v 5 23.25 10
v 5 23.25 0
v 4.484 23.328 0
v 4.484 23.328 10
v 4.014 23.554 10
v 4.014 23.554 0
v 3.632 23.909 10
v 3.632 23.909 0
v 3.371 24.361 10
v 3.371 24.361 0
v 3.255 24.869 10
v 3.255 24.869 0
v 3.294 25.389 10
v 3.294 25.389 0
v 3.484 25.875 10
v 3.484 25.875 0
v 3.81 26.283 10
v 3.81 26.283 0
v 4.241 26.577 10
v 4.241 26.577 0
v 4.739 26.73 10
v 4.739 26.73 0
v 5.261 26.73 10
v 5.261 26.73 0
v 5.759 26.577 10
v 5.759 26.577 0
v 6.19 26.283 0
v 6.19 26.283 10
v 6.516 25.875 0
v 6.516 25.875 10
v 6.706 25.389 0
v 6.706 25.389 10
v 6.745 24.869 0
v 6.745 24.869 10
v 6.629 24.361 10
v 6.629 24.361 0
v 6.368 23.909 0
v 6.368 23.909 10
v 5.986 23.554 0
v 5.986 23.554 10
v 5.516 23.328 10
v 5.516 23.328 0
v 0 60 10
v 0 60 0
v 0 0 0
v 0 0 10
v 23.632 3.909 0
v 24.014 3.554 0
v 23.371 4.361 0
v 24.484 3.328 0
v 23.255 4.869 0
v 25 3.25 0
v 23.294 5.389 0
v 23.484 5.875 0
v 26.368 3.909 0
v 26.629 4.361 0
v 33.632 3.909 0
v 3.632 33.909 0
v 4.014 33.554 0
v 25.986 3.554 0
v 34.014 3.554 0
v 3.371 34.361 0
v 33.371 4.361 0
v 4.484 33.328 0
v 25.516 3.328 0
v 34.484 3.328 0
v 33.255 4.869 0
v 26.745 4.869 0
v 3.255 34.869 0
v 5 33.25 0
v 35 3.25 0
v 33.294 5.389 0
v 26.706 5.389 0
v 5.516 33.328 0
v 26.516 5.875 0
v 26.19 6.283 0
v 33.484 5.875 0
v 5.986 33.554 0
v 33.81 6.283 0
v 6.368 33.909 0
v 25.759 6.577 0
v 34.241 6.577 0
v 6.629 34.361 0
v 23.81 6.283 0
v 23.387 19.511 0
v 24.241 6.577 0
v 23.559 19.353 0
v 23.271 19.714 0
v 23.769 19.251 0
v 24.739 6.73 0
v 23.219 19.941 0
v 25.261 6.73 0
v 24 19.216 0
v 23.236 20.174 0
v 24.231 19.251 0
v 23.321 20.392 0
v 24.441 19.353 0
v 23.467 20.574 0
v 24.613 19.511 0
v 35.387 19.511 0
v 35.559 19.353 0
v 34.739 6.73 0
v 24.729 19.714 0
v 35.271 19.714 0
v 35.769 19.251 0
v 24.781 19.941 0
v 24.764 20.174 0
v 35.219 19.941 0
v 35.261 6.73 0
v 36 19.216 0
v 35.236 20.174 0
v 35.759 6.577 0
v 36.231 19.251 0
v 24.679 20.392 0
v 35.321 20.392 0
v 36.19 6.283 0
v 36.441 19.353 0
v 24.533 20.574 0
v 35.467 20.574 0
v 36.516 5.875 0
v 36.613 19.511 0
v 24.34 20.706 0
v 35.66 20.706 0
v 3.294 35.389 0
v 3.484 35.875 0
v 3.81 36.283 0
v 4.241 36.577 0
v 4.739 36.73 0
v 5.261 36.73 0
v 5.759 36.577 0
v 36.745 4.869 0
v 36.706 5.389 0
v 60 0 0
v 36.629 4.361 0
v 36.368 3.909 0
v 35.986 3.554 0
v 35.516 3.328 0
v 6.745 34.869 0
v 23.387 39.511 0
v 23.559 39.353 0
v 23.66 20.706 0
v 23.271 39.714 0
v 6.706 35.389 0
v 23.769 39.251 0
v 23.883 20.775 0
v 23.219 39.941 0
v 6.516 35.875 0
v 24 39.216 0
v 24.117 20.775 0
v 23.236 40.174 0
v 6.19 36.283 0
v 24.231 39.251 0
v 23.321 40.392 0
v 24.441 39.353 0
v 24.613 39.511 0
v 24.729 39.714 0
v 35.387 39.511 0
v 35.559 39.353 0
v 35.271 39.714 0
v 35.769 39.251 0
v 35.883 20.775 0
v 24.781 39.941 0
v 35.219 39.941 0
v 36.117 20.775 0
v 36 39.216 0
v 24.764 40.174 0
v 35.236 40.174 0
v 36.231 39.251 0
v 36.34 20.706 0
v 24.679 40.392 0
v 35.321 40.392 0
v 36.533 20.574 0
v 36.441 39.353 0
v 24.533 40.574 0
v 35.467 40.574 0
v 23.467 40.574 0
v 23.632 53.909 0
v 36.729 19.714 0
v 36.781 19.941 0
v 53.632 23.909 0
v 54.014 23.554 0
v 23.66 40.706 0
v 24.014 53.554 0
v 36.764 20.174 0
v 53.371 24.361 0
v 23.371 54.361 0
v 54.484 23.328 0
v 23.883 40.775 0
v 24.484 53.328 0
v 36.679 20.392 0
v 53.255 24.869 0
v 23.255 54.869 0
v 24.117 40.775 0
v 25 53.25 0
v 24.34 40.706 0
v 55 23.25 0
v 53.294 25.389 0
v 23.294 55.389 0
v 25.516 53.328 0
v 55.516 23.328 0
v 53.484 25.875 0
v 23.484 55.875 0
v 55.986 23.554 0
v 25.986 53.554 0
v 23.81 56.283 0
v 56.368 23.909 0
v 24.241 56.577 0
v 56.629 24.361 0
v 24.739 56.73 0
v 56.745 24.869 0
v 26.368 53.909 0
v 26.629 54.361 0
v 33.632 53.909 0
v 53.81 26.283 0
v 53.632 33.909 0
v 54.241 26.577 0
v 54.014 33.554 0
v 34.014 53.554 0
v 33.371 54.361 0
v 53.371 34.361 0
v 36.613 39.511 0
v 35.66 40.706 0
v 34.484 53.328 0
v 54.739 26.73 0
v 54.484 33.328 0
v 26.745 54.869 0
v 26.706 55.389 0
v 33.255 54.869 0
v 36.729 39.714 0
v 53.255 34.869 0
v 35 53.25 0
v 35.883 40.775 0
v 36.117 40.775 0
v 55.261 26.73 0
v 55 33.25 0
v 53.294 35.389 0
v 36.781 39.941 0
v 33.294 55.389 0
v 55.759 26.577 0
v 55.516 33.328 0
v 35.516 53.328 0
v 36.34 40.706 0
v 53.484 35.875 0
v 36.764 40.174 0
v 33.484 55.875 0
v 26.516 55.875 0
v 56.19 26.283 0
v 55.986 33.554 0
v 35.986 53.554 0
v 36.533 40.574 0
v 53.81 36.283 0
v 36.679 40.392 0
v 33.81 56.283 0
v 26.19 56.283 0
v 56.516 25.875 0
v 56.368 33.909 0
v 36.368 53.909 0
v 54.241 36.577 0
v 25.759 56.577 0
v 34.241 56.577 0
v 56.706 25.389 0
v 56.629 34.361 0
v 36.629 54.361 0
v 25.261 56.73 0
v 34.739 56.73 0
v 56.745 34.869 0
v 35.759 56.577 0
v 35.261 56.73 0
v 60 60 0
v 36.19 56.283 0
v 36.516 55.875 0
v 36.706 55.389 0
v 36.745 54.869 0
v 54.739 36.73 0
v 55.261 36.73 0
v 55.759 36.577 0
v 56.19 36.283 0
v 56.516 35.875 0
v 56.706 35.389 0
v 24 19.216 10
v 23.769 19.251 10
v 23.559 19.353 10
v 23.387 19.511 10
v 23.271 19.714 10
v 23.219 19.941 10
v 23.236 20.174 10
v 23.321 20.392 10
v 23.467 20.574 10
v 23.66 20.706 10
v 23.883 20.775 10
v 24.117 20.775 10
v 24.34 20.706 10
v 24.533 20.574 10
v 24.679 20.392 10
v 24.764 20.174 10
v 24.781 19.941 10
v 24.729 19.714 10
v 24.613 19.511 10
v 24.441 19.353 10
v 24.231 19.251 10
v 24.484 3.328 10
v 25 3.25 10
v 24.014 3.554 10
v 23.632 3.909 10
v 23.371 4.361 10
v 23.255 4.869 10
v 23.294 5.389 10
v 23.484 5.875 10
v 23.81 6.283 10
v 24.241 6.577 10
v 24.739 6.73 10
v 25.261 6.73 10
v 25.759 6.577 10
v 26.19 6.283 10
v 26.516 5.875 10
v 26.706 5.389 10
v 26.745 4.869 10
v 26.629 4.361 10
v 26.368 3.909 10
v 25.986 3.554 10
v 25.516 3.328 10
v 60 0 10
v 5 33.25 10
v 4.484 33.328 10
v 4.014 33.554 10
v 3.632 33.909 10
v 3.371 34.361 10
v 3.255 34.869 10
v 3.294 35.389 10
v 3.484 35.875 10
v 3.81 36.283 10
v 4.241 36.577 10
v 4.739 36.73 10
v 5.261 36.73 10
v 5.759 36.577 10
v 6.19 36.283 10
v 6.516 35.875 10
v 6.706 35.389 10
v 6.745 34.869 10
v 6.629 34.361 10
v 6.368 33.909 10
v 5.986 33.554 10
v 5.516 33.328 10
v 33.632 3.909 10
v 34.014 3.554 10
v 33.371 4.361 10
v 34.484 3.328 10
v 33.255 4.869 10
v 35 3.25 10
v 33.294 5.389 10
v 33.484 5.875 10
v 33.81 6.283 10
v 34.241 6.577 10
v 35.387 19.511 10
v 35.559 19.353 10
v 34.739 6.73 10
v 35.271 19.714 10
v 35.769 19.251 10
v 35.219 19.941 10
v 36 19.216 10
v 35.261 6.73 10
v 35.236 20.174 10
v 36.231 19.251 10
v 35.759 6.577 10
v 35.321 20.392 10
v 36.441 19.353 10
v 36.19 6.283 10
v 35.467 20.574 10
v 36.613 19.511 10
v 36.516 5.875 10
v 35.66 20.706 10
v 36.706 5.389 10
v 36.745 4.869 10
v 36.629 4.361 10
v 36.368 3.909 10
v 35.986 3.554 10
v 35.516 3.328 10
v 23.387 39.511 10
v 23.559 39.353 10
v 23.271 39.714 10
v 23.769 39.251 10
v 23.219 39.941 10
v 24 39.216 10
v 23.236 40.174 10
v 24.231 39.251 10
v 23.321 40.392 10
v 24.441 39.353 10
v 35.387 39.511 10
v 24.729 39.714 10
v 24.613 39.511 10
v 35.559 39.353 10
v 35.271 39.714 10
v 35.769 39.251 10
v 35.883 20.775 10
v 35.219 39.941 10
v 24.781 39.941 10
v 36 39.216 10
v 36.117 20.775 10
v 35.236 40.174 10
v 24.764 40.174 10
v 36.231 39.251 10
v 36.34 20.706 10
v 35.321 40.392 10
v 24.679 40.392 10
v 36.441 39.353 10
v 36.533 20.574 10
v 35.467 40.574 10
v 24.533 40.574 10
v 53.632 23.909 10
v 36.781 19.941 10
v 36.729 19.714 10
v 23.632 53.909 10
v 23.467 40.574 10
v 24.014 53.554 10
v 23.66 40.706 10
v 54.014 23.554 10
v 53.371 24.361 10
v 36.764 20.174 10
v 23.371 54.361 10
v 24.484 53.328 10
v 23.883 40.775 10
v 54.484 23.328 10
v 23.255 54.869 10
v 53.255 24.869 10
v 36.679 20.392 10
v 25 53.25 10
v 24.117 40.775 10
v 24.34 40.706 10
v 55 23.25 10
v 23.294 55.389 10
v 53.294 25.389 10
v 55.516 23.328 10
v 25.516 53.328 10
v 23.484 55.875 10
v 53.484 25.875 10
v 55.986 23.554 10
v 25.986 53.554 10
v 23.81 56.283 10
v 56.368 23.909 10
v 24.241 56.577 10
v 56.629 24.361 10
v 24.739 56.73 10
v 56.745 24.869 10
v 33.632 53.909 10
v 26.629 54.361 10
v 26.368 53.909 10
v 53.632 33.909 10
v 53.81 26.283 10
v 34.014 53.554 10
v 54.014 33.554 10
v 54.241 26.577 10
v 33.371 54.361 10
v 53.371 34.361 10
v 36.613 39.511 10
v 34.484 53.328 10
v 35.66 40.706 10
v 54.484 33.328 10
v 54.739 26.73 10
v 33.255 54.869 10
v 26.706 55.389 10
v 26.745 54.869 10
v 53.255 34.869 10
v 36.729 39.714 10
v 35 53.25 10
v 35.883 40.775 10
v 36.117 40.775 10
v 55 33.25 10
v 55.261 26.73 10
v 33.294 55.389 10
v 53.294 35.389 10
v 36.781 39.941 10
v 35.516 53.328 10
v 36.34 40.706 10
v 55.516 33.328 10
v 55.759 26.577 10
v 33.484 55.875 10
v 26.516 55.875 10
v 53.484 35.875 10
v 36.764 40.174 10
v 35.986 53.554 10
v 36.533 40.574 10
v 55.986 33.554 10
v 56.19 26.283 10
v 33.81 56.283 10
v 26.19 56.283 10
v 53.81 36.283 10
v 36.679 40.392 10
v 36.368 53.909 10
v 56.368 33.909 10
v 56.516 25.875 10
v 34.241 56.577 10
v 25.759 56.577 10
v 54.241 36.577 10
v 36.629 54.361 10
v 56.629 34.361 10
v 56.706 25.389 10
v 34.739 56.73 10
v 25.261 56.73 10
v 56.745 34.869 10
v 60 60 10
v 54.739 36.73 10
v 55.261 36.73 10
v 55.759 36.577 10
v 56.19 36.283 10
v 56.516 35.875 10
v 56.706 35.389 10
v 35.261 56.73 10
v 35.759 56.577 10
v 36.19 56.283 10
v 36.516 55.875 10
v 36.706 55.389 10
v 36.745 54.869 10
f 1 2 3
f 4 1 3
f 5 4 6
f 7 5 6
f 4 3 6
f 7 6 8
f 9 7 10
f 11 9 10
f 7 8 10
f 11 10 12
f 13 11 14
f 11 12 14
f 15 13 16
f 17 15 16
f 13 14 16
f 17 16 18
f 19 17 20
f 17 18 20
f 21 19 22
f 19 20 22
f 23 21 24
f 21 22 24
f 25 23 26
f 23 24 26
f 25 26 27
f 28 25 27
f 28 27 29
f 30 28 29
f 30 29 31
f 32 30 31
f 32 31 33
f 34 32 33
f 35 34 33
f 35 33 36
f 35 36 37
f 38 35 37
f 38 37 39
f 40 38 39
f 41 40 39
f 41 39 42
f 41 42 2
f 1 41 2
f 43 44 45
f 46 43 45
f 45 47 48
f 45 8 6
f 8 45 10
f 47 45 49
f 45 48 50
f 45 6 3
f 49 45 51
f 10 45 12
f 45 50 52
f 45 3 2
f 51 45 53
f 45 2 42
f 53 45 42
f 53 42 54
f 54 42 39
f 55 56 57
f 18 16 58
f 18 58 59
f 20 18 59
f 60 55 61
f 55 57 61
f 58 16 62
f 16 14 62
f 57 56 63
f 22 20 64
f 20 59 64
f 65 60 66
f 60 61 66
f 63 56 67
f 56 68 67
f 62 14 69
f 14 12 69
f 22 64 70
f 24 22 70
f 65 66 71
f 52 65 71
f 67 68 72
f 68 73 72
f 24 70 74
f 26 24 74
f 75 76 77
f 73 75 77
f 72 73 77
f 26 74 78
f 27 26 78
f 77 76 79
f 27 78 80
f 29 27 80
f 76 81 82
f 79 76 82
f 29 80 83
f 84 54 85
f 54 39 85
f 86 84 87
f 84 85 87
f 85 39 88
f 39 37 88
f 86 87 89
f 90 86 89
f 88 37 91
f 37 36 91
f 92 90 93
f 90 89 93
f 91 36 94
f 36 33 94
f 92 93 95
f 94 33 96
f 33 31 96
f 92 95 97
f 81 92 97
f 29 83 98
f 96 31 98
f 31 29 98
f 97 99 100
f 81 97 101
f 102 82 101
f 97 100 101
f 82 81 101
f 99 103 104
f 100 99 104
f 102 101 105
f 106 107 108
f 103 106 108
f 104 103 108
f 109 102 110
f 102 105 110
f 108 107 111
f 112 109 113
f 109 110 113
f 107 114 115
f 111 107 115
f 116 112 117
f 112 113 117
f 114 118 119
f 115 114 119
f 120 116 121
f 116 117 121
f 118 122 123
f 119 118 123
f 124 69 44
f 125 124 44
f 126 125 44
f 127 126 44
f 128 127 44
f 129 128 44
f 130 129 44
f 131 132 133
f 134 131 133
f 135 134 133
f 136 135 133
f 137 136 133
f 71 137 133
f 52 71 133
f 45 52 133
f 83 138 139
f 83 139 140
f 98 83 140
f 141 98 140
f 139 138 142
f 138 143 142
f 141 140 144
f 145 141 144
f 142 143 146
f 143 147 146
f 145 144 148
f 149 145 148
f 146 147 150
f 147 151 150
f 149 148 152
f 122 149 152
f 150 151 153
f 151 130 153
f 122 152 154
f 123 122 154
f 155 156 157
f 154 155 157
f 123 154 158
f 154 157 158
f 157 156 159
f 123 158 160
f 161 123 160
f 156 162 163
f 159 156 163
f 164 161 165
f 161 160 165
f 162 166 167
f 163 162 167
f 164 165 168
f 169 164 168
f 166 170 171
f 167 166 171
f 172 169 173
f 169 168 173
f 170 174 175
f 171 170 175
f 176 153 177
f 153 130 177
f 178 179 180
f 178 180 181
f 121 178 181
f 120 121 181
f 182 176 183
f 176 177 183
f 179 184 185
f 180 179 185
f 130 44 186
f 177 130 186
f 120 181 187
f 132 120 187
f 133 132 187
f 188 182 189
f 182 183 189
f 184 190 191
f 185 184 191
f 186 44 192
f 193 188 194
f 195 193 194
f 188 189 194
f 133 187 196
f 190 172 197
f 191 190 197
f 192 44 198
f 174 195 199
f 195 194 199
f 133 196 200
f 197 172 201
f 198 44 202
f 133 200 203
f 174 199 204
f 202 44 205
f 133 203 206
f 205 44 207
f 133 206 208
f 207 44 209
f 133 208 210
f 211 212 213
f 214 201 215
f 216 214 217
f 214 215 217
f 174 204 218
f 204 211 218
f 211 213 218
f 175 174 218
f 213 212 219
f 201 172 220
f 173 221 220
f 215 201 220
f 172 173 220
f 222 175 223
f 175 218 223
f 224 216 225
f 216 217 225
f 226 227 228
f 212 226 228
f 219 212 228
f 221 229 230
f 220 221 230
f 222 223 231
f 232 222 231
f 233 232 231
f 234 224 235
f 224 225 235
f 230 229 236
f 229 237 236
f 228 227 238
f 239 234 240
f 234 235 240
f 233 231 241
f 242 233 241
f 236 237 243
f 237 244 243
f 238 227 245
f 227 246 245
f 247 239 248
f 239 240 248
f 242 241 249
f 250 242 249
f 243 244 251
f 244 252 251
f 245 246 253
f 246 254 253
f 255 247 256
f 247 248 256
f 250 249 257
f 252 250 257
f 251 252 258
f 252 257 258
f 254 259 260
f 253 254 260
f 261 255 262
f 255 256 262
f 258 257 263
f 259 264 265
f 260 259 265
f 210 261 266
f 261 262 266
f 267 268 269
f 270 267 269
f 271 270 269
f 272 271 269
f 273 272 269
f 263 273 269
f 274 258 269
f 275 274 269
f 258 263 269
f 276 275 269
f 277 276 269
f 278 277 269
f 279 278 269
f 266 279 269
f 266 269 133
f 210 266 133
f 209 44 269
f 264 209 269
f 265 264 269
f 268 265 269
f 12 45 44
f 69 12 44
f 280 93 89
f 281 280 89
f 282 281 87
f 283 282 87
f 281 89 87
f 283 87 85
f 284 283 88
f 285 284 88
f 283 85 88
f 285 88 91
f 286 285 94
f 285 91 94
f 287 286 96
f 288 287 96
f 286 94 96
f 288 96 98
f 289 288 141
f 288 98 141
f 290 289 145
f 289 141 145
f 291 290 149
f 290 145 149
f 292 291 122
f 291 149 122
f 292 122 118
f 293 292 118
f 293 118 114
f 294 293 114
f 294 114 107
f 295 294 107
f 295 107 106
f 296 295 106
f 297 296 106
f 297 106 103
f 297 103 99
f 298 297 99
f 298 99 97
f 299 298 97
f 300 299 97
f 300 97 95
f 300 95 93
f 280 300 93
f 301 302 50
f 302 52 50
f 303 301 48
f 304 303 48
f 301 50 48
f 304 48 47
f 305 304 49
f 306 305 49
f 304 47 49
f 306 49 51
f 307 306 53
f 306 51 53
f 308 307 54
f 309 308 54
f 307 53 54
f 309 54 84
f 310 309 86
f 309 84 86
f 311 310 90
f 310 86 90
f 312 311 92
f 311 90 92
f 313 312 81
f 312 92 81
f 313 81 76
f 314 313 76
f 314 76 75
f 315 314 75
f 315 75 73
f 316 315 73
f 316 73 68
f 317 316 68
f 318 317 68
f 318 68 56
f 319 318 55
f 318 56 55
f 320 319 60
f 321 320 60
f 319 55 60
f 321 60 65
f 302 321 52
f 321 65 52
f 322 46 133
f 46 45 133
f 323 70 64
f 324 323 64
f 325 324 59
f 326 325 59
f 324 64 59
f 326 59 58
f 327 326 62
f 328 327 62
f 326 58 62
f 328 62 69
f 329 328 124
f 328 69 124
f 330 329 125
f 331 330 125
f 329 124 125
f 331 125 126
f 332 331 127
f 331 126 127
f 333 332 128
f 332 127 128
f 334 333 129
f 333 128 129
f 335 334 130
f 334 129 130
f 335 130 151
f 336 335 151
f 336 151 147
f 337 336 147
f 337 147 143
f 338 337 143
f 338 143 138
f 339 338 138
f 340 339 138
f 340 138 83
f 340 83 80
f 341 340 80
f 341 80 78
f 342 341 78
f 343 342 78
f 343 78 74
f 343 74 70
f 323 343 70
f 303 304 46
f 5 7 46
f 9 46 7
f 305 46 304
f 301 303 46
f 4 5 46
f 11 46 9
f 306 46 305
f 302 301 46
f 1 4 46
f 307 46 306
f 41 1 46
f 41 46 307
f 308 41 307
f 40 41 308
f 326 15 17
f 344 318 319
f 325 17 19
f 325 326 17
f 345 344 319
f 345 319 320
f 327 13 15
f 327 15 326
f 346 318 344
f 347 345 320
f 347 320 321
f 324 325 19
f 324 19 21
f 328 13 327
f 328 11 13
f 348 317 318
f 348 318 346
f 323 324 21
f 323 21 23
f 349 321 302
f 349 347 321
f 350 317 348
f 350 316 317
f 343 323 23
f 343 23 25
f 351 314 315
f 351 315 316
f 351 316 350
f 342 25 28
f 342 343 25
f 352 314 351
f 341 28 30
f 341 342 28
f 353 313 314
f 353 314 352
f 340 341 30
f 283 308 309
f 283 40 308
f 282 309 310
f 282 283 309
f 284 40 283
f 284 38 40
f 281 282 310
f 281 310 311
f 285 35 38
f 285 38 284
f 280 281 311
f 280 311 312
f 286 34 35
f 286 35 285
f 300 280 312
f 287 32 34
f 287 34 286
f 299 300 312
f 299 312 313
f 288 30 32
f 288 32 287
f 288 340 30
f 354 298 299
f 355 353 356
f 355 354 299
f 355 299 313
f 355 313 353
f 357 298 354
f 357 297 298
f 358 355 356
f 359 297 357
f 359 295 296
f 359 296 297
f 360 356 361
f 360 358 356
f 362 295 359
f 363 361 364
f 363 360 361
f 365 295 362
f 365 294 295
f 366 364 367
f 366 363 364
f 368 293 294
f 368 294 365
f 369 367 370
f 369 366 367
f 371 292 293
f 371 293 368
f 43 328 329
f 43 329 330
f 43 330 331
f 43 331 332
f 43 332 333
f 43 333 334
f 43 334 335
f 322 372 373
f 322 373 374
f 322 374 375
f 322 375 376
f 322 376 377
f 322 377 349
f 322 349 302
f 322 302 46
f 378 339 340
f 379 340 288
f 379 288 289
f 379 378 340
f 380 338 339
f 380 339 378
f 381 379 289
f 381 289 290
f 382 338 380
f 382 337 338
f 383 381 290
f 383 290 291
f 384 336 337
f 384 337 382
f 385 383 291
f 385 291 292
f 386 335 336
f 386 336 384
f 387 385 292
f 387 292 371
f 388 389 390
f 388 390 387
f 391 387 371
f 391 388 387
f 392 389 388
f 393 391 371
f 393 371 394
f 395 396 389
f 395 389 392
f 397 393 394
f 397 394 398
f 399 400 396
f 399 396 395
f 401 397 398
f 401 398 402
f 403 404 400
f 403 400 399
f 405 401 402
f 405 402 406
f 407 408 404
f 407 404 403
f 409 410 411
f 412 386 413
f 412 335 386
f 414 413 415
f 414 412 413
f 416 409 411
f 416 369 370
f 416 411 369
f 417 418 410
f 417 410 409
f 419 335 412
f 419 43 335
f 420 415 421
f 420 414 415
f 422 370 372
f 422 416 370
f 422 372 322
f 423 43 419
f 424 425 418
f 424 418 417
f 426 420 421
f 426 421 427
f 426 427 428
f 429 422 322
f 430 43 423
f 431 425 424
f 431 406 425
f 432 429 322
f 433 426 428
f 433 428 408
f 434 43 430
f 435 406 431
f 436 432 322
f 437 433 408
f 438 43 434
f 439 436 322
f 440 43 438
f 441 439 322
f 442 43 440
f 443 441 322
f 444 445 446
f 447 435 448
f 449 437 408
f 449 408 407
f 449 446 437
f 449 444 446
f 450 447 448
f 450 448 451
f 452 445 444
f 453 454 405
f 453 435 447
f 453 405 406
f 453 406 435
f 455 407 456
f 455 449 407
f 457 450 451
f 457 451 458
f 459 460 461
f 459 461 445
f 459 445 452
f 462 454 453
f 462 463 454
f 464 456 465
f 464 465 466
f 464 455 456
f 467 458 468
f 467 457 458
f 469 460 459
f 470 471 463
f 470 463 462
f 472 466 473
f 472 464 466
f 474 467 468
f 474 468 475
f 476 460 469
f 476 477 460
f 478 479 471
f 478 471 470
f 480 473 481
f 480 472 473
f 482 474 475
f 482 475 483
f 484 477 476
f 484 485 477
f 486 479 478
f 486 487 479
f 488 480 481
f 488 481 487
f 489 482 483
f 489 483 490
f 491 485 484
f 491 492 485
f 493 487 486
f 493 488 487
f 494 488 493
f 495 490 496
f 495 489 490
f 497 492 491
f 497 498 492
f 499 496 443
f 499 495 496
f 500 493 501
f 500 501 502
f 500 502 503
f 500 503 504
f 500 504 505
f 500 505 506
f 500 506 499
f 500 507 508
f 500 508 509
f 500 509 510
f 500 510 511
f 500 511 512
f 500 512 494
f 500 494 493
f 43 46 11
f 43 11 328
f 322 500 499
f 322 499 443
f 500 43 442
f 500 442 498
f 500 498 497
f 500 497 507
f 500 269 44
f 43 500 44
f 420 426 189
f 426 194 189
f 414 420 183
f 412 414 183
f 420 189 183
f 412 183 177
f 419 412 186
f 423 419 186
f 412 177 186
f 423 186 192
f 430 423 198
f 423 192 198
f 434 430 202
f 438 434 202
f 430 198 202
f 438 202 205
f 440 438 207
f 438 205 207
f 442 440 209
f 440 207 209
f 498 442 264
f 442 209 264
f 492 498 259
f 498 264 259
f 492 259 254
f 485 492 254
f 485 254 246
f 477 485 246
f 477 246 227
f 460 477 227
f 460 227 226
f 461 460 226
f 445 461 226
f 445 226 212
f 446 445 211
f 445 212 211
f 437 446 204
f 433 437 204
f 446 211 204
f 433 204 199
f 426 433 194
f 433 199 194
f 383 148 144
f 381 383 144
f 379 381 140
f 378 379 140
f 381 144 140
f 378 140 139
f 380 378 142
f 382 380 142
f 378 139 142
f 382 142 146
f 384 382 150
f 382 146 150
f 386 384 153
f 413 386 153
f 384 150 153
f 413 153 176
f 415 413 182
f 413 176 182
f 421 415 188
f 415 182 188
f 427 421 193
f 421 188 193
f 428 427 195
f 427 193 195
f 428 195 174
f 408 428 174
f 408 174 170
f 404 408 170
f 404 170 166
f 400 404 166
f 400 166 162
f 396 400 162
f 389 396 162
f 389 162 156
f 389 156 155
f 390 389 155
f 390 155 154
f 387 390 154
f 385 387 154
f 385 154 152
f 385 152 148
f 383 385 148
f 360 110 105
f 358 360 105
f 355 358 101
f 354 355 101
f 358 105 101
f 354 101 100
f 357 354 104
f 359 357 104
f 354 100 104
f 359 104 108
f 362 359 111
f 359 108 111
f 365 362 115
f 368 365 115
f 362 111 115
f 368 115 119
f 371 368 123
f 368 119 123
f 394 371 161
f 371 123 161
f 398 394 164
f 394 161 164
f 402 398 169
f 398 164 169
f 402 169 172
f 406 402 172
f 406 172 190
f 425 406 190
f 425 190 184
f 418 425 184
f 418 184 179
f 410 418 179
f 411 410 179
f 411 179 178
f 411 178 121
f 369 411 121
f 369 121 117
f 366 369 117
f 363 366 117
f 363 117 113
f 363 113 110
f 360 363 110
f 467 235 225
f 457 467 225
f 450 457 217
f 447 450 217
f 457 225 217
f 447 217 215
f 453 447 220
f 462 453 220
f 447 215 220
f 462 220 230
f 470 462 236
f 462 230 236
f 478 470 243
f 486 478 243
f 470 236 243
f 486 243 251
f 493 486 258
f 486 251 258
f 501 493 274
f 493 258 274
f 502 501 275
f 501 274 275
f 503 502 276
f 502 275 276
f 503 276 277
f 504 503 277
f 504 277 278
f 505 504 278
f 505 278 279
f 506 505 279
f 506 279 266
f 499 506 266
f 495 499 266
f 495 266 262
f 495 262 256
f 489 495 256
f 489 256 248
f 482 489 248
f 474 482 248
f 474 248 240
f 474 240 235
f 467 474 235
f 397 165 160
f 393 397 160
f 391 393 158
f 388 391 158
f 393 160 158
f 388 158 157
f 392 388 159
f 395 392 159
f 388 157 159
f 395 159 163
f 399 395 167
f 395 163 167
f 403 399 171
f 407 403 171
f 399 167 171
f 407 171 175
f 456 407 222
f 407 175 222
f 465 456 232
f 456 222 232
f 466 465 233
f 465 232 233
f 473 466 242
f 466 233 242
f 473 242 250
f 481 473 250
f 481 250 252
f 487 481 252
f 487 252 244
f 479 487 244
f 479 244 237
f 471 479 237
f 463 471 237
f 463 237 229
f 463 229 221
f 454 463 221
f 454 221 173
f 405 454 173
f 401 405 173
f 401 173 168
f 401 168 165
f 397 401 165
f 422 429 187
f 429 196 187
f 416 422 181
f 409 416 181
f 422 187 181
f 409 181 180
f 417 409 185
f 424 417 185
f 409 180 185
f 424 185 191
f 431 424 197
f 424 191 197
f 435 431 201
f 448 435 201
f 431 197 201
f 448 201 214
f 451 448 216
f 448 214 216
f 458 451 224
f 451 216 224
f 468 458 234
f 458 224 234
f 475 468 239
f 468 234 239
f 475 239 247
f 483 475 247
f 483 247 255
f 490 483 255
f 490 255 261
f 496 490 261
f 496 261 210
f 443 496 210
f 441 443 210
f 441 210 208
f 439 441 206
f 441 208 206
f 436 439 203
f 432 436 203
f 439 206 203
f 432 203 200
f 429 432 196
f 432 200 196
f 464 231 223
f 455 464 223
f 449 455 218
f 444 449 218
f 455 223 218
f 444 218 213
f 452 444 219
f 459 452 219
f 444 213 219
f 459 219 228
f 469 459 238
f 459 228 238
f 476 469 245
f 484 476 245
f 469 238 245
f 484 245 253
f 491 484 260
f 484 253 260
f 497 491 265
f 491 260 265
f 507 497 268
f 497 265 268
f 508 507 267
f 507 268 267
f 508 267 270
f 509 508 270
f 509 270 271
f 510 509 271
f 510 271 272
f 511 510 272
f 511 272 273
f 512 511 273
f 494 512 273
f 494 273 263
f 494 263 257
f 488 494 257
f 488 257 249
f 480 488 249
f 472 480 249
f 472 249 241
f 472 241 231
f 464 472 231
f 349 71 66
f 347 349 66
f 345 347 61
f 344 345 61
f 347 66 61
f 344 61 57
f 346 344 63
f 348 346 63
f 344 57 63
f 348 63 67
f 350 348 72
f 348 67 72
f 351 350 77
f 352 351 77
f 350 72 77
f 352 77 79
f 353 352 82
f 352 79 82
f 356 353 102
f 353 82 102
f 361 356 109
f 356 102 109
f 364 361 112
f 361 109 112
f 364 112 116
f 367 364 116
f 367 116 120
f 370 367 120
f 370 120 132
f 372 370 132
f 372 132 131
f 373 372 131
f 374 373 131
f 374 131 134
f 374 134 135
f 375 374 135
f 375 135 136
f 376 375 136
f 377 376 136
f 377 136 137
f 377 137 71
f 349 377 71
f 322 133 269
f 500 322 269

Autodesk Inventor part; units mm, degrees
ref_plane "YZ Plane" through (0, 0, 0) normal (1, 0, 0) x (0, 1, 0)
ref_plane "XZ Plane" through (0, 0, 0) normal (0, 1, 0) x (-1, 0, 0)
ref_plane "XY Plane" through (0, 0, 0) normal (0, 0, 1) x (1, 0, 0)
sketch "スケッチ1" plane through (0, 0, 0) normal (0, 0, 1) x (1, 0, 0)
  line L0 (0, 0) -> (60, 0)
  line L1 (60, 0) -> (60, 60)
  line L2 (60, 60) -> (0, 60)
  line L3 (0, 60) -> (0, 0)
  dimension "d0" = 60
  dimension "d1" = 60
extrude "押し出し1" add sketch "スケッチ1" along normal blind 10
sketch "スケッチ2" plane through (0, 0, 10) normal (0, 0, 1) x (1, 0, 0)
  line L0 (60, 60) -> (0, 60) projected
  line L1 (60, 0) -> (60, 60) projected
  line L2 (0, 0) -> (60, 0) projected
  line L3 (30, 60) -> (30, 0)
  point P0 (35, 55)
  point P1 (55, 35)
  point P2 (55, 25)
  point P3 (35, 5)
  point P4 (25, 55)
  point P5 (5, 35)
  point P6 (5, 25)
  point P7 (25, 5)
  dimension "d4" = 5
  dimension "d5" = 5
  dimension "d6" = 5
  dimension "d7" = 5
  dimension "d8" = 25
  dimension "d9" = 25
  dimension "d10" = 25
  dimension "d11" = 25
hole "穴1" at (35, 55, 10) at (55, 35, 10) at (55, 25, 10) at (35, 5, 10) at (25, 55, 10) at (5, 35, 10) at (5, 25, 10) at (25, 5, 10) direction (0, 0, -1) diameter 3.5 end through all
sketch "スケッチ8" plane through (0, 0, 10) normal (0, 0, 1) x (1, 0, 0)
  line L0 (60, 60) -> (0, 60) projected
  line L1 (30, 60) -> (30, 0)
  line L2 (0, 0) -> (60, 0) projected
  line L3 (0, 60) -> (0, 0) projected
  line L4 (0, 30) -> (60, 30)
  line L5 (60, 0) -> (60, 60) projected
  point P0 (24, 40)
  point P1 (24, 20)
  point P2 (36, 40)
  point P3 (36, 20)
  dimension "d24" = 12
  dimension "d25" = 20
  dimension "d28" = 20
  dimension "d31" = 12
hole "穴2" at (24, 40, 10) at (24, 20, 10) at (36, 40, 10) at (36, 20, 10) direction (0, 0, -1) diameter 1.567 end through all thread size "M2x0.4" class "6H" standard "ISO Metric profile"
properties part number "土台"
